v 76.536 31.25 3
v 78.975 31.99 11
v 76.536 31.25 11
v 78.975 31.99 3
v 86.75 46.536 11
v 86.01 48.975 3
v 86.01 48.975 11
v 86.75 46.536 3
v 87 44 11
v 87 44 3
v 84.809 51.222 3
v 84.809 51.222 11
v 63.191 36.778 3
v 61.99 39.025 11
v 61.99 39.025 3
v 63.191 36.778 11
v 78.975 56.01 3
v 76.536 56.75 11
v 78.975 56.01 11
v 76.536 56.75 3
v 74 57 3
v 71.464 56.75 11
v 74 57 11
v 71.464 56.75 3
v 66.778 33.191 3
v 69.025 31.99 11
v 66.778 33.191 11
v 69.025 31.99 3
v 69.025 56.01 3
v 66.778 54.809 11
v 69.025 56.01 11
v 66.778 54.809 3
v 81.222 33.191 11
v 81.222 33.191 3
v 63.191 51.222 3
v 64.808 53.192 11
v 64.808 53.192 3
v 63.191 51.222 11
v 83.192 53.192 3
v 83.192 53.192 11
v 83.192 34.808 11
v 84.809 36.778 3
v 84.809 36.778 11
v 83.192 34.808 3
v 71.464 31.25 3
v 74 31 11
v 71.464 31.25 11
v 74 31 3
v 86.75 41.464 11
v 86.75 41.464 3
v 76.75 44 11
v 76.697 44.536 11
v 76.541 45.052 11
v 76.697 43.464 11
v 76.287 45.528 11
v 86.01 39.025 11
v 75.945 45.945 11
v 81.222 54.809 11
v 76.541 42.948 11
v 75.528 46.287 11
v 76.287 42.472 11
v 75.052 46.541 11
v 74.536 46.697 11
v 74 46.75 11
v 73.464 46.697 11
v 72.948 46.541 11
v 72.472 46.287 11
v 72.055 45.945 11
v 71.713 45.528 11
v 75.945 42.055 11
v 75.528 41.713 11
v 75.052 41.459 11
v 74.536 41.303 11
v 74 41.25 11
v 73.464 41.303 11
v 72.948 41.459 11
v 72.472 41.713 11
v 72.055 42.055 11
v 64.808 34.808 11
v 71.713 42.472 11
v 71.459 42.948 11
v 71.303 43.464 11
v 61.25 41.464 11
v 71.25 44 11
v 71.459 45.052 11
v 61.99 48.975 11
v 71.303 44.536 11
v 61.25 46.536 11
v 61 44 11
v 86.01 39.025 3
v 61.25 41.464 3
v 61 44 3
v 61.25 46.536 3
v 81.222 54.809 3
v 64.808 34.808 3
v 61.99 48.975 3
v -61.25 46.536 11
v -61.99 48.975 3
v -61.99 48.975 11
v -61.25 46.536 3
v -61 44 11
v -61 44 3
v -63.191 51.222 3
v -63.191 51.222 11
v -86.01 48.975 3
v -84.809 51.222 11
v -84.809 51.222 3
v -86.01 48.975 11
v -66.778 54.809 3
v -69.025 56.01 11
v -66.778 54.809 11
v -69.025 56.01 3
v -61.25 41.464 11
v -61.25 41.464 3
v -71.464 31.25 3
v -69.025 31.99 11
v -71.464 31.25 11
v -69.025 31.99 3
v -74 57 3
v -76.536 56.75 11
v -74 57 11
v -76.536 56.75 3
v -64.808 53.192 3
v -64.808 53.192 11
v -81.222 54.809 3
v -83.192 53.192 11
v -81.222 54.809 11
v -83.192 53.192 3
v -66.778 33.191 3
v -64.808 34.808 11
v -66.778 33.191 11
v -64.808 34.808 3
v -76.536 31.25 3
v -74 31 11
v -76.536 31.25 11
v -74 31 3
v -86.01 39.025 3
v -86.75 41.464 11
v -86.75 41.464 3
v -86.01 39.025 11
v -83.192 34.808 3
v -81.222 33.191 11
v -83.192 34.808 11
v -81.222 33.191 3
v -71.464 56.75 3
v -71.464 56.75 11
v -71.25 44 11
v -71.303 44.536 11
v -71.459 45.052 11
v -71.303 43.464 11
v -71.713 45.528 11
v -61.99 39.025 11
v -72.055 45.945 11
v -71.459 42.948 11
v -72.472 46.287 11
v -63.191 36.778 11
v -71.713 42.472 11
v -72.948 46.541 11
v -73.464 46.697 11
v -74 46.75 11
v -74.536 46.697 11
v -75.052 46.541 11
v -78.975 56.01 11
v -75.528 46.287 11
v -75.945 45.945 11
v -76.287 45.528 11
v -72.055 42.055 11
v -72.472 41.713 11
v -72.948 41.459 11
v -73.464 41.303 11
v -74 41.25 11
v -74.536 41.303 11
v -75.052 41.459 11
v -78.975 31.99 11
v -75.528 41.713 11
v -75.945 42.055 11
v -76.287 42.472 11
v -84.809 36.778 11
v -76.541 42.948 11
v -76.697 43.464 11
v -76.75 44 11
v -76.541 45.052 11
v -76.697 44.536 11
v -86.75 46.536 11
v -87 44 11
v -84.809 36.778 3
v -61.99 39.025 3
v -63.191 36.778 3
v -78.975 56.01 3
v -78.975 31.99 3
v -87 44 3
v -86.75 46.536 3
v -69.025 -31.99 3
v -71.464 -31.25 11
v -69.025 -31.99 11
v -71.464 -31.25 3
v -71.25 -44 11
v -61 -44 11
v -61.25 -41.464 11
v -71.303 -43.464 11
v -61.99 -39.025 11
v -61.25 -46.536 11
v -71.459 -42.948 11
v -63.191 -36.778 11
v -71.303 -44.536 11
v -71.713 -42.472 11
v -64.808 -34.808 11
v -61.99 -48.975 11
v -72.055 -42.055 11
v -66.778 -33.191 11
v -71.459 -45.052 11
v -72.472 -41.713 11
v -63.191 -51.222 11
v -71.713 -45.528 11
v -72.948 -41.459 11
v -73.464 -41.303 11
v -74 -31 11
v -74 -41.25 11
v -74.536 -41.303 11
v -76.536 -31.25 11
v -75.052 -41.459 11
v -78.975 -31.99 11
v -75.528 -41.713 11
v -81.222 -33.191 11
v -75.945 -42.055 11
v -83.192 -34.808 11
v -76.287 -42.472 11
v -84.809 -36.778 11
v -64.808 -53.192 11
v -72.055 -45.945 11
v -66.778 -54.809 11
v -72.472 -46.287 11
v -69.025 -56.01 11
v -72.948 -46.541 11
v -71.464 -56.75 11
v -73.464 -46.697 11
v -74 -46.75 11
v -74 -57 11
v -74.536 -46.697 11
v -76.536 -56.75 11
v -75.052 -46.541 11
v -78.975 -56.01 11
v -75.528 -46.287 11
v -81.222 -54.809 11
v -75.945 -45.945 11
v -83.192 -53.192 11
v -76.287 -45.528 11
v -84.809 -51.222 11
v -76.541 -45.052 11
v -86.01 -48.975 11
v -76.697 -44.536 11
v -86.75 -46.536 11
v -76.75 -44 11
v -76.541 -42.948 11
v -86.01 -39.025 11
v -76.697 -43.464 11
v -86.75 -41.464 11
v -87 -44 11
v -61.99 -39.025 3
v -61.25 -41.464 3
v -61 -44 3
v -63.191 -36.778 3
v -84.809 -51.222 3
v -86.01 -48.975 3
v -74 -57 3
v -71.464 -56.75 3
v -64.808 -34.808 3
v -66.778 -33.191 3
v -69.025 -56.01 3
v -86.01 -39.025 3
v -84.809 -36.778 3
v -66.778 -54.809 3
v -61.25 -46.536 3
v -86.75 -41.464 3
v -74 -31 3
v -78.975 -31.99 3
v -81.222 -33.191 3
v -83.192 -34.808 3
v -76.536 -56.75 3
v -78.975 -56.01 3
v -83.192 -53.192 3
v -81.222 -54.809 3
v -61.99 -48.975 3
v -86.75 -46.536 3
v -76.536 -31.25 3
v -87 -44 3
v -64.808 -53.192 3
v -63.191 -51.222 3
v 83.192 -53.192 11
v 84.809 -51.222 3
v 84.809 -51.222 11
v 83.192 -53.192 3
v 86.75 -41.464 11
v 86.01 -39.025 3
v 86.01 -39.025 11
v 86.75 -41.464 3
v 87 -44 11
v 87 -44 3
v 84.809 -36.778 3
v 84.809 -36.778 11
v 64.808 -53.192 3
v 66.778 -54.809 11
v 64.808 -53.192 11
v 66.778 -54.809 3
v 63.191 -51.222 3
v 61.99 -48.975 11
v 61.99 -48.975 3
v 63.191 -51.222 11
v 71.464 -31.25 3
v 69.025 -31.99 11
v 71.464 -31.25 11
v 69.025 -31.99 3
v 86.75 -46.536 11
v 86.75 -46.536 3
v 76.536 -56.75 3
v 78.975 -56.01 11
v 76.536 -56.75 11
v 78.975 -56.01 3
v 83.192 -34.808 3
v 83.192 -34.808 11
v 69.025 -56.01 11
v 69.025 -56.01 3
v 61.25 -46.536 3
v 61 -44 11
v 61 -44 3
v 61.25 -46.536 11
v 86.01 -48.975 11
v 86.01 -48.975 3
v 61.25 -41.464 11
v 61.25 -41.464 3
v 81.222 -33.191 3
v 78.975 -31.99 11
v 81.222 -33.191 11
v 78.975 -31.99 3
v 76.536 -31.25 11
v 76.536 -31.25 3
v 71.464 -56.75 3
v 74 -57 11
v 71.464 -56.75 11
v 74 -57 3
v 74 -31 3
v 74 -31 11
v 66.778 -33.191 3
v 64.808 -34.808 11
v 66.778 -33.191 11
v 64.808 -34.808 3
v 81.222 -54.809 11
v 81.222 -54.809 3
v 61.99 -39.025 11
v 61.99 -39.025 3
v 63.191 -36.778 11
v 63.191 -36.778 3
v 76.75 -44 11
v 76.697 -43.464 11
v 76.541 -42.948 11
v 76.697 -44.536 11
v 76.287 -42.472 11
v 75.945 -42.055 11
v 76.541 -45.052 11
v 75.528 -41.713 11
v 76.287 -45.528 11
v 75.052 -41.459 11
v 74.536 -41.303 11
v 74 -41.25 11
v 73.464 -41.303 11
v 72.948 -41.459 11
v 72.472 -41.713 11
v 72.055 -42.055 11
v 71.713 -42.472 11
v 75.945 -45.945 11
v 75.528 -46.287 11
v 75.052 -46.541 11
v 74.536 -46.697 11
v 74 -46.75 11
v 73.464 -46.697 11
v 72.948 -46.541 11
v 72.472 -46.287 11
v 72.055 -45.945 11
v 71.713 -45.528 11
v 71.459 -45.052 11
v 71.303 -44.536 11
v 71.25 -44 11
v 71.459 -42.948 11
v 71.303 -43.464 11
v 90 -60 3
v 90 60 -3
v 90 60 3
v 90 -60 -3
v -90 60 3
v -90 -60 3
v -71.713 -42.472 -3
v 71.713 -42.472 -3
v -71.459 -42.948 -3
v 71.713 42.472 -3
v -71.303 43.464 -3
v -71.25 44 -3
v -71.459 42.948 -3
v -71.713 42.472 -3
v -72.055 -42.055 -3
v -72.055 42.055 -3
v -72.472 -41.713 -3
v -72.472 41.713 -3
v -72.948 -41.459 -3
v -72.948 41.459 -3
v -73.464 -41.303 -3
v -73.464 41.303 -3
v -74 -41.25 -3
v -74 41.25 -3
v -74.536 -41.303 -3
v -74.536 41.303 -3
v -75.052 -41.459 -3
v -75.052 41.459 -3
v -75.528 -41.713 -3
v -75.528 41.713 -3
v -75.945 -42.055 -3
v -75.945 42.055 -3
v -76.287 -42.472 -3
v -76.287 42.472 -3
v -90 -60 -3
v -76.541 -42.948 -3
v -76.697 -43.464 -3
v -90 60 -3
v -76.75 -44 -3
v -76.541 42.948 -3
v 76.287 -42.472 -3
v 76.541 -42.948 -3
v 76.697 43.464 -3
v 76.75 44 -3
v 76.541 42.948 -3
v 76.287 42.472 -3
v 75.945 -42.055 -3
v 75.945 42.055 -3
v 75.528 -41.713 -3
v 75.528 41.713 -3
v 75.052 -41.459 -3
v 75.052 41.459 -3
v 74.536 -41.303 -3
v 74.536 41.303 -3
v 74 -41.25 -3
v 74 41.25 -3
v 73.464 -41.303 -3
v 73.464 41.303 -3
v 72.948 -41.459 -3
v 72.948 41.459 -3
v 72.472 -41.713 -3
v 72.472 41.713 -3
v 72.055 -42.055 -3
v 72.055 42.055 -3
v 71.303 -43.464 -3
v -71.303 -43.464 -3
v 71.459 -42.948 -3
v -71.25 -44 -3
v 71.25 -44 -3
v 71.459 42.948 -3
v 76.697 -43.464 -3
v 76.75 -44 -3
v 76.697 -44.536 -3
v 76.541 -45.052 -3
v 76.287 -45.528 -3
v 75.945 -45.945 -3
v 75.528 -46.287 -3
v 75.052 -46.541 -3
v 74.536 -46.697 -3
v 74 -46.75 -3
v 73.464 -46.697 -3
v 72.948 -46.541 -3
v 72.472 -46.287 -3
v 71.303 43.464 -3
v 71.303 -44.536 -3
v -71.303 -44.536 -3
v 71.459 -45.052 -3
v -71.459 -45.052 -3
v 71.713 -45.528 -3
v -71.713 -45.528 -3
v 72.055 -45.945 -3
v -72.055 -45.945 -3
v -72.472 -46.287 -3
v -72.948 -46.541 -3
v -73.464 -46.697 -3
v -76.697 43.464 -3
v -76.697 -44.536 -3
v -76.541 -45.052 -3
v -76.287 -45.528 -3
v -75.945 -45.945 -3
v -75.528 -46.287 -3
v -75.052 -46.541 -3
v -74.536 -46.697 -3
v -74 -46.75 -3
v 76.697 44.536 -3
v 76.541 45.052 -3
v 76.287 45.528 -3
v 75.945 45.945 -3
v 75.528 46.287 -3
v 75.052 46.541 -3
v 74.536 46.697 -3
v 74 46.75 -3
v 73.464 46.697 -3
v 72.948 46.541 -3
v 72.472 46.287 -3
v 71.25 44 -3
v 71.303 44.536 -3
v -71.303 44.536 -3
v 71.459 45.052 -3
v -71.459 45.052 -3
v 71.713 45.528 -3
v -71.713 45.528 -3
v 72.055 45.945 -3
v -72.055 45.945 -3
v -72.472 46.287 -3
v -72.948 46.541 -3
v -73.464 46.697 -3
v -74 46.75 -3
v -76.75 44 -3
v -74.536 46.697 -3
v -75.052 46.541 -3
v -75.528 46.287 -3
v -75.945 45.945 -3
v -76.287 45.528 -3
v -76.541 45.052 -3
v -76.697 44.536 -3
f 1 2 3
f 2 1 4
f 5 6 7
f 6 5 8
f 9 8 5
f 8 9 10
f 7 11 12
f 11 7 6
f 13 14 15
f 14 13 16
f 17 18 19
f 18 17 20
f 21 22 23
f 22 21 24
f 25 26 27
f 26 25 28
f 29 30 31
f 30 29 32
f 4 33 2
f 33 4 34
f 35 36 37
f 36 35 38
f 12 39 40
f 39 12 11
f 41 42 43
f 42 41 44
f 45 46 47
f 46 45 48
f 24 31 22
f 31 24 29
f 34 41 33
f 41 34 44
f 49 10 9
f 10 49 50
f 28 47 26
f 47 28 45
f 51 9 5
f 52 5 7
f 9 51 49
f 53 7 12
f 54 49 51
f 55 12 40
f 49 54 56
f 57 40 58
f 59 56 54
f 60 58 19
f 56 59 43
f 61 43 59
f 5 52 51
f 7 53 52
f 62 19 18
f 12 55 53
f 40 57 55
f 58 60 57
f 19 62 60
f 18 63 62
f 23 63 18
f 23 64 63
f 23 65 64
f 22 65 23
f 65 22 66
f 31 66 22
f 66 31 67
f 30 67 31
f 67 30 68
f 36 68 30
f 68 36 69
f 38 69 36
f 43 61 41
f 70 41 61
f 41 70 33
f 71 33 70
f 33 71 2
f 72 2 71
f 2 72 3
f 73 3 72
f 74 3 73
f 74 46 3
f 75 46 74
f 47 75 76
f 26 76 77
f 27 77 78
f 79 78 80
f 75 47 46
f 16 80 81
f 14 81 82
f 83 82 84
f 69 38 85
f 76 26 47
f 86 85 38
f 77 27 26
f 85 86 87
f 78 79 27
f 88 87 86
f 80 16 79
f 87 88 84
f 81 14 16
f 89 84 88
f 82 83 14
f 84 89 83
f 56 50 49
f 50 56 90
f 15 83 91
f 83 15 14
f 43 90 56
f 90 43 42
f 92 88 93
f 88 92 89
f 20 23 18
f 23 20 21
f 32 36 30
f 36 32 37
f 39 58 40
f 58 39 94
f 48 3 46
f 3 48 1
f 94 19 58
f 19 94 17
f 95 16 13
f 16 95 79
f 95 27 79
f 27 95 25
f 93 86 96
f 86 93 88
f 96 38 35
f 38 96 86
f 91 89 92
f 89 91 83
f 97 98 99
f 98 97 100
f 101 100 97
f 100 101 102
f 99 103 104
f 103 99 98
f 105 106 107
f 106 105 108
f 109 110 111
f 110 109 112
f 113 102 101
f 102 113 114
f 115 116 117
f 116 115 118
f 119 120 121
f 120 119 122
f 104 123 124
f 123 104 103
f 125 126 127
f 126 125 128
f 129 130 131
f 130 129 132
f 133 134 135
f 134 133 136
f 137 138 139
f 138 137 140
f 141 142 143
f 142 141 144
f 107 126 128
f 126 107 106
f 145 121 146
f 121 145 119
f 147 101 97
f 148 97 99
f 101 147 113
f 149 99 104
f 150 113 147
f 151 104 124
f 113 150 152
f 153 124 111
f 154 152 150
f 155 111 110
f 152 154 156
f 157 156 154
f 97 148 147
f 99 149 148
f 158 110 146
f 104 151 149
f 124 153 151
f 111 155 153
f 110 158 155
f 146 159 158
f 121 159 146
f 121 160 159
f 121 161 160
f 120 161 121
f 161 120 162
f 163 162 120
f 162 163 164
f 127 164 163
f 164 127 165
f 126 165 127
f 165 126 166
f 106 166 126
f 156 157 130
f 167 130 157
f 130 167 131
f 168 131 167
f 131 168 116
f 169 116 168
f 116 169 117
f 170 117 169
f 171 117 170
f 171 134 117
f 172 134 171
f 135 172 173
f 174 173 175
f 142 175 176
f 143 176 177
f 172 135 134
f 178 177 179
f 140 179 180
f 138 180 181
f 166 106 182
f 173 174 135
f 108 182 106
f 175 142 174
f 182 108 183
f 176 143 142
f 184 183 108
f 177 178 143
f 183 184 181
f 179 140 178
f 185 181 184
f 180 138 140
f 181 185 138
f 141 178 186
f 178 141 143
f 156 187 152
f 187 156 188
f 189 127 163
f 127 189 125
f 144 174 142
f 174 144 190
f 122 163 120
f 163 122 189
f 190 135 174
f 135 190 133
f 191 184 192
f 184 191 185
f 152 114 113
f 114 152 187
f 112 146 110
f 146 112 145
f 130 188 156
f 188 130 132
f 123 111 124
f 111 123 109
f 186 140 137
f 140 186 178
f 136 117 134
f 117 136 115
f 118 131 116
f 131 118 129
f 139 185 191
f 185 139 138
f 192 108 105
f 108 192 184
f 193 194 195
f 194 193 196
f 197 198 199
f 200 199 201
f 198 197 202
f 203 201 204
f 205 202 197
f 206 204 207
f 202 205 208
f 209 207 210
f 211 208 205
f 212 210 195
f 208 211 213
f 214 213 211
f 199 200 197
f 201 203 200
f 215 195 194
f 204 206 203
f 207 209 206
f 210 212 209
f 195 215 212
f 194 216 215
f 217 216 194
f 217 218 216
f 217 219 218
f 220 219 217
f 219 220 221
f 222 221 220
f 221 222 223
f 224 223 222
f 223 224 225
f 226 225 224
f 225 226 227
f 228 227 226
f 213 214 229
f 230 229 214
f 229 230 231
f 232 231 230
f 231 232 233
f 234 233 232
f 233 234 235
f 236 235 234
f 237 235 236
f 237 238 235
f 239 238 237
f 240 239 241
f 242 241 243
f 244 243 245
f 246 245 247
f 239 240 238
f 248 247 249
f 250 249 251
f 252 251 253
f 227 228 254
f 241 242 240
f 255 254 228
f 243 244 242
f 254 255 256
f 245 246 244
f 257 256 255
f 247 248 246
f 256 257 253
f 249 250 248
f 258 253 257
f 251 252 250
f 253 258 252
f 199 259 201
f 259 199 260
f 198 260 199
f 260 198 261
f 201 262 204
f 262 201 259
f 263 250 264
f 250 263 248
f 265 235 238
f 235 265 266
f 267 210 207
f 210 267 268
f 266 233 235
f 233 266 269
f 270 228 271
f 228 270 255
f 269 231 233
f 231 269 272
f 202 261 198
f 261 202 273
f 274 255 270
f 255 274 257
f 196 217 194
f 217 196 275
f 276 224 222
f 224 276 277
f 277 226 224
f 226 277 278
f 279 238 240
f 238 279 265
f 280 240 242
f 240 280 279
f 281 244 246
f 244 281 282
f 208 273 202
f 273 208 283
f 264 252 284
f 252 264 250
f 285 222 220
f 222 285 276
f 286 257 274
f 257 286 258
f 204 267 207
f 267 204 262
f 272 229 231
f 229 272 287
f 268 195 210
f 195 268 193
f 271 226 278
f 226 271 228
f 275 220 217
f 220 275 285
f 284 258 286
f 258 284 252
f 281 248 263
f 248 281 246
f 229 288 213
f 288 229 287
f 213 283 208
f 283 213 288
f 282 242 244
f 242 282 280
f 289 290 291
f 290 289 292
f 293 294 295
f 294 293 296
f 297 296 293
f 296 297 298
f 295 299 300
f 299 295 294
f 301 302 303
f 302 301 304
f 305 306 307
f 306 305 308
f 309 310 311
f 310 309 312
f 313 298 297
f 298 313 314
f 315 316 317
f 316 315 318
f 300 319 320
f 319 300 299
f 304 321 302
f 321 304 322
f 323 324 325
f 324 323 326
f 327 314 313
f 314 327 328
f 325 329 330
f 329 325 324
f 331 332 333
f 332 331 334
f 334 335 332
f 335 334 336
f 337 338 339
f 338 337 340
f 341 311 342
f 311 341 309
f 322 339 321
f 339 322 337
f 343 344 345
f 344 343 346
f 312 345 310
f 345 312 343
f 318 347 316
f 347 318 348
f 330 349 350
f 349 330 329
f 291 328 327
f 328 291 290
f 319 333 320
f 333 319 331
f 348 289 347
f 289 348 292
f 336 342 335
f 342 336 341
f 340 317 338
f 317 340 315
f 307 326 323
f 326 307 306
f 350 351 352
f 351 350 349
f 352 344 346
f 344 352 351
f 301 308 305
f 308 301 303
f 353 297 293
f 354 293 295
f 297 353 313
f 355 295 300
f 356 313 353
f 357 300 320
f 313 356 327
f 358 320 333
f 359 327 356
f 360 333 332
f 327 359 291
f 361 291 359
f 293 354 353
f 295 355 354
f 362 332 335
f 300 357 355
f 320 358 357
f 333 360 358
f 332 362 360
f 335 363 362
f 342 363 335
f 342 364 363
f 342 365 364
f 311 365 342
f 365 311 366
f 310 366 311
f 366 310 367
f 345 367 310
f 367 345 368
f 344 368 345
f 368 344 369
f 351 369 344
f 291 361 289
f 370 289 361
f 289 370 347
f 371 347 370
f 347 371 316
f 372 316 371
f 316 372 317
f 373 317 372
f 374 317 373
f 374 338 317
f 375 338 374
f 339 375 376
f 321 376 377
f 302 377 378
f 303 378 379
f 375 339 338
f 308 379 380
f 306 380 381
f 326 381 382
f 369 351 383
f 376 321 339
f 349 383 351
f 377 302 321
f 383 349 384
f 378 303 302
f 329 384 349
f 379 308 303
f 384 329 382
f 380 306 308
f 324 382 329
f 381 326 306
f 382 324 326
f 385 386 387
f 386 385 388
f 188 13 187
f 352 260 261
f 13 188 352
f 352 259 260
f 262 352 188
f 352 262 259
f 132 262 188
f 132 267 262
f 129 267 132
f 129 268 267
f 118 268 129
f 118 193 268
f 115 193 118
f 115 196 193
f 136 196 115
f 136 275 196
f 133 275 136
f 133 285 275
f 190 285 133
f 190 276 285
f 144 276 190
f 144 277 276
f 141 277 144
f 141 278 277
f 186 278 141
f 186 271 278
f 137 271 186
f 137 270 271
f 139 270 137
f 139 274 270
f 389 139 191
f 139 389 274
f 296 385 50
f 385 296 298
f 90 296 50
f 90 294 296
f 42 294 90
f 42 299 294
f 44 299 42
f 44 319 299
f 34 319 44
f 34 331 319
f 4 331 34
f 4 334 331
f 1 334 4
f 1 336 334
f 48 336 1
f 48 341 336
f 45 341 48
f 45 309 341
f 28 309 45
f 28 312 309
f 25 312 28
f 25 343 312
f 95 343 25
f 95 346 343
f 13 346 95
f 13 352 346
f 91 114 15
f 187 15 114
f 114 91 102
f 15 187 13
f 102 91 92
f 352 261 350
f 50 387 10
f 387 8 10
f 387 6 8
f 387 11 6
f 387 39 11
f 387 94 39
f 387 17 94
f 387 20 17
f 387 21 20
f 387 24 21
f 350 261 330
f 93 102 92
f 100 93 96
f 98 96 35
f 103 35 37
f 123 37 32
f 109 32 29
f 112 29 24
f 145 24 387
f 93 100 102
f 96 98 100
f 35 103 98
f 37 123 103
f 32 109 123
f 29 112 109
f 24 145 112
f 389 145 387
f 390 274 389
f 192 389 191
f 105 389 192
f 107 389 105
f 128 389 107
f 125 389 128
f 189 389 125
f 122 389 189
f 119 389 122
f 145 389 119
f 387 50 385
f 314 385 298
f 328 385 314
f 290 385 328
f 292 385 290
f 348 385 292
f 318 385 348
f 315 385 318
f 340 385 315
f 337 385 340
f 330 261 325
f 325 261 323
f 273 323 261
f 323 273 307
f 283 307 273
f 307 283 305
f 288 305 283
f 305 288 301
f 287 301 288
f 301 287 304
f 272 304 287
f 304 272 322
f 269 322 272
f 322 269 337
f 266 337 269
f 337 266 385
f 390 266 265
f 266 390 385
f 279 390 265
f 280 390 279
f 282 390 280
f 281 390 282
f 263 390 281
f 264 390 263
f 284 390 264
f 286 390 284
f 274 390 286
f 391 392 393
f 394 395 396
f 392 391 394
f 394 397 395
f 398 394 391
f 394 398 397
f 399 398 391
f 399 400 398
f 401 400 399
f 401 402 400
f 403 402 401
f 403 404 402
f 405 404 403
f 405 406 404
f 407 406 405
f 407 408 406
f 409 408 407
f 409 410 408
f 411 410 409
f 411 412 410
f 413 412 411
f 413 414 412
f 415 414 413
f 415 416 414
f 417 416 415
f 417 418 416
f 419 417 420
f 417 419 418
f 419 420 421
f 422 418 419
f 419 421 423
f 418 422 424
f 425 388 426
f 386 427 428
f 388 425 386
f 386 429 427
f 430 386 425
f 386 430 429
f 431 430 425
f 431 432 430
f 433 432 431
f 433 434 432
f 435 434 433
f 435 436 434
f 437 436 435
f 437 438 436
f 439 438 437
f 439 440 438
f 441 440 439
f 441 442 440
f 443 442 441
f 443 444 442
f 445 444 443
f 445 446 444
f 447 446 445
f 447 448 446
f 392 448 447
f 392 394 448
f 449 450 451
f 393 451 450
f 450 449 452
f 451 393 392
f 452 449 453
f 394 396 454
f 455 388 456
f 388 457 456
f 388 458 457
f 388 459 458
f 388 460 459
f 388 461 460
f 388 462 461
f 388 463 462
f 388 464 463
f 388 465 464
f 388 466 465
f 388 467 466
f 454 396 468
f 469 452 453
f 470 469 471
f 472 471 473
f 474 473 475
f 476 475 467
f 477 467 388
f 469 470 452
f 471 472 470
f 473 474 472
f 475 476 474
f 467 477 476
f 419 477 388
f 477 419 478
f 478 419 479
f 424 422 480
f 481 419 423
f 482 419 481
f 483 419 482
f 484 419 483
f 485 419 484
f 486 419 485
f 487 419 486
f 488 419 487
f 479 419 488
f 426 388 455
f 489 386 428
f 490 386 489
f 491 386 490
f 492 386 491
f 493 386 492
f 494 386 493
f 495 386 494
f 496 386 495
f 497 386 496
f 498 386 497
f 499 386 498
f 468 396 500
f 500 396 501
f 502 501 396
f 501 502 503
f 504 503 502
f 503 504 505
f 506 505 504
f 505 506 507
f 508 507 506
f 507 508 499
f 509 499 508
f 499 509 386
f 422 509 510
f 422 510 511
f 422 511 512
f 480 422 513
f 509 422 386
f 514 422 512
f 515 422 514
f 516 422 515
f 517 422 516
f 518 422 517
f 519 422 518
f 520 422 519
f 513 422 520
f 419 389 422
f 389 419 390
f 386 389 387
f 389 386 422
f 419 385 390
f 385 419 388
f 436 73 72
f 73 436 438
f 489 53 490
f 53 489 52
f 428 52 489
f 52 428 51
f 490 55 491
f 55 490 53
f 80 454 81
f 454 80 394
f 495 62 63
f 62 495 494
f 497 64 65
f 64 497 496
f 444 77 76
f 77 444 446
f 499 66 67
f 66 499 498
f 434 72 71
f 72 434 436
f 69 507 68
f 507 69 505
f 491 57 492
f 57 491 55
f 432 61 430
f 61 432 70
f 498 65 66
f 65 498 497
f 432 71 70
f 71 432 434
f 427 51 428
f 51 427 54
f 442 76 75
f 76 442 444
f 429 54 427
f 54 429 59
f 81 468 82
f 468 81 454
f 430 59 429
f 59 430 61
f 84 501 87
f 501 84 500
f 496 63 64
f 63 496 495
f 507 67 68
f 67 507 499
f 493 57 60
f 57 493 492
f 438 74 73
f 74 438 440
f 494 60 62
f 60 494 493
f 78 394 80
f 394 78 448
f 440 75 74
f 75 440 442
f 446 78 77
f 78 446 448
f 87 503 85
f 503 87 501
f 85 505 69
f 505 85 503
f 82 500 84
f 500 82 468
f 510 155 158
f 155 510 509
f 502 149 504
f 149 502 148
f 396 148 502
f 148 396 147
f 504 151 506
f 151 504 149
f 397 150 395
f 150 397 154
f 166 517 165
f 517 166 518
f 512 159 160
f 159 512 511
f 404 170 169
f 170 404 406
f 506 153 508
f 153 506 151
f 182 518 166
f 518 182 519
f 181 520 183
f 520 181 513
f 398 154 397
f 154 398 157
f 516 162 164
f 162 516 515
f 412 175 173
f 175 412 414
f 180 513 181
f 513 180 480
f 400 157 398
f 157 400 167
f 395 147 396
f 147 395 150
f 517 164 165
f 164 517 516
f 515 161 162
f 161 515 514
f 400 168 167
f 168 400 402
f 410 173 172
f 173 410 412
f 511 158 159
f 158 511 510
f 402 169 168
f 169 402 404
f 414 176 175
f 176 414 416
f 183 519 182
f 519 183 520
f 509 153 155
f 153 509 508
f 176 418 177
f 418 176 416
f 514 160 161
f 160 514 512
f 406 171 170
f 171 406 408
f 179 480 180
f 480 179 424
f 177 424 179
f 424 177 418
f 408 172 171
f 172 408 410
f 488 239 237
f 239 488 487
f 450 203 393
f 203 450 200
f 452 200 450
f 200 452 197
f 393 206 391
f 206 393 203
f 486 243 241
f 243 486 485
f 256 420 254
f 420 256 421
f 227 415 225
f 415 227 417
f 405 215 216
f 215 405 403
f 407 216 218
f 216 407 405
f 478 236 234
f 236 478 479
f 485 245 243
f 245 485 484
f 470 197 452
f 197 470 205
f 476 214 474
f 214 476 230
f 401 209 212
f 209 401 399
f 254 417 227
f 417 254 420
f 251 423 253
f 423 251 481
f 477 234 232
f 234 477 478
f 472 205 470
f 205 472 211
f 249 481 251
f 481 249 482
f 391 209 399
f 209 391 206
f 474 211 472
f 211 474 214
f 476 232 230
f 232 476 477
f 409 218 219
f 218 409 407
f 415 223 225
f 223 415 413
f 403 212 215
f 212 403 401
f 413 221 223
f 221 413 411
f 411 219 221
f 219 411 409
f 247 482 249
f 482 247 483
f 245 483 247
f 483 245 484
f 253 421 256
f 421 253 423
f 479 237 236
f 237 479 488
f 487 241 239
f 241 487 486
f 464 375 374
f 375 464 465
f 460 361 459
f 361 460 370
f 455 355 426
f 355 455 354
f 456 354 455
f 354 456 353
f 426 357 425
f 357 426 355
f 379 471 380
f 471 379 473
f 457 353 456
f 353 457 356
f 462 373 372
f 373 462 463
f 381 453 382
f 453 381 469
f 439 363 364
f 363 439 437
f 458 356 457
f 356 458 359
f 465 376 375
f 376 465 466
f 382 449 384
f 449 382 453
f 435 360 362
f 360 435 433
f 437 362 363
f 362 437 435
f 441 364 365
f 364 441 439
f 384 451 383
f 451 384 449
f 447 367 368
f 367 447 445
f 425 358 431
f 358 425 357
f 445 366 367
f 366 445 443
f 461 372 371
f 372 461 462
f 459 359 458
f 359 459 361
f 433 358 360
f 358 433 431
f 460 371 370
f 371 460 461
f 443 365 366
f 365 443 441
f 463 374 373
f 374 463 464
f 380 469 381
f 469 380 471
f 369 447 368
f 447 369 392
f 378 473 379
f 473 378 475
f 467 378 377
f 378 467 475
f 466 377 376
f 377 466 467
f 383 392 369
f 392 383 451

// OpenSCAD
$fn = 32;

// ----------------------------------------------------------------------
// Anchor pads 180 x 120 x 14
// four corner bosses with anchor holes
// ----------------------------------------------------------------------

// --- parameters (mm) ---
plate = [180, 120, 6];  // base plate size (x, y, z)
pads = 4;               // boss count, one per corner
edge = 16;              // boss centre offset from the plate edge
boss_d = 26;            // boss diameter
boss_h = 8;             // boss height above the base plate
hole_d = 5.5;           // hole diameter

// --- derived feature positions (mm) ---
height = plate[2] + boss_h;      // = 14   overall height of the part
corner_x = plate[0] / 2 - edge;  // = 74   boss centre X
corner_y = plate[1] / 2 - edge;  // = 44   boss centre Y
feature_centers = [
  [corner_x, corner_y],
  [-corner_x, corner_y],
  [-corner_x, -corner_y],
  [corner_x, -corner_y]
];   // boss centres, anchor holes are drilled there

// base plate, four bosses standing on it, anchor holes all the way through
difference() {
  union() {
    cube(plate, center = true);
    for (centre = feature_centers)
      translate([centre[0], centre[1], plate[2] / 2 - 1])
        cylinder(d = boss_d, h = boss_h + 1);
  }
  for (centre = feature_centers)
    translate([centre[0], centre[1], -height])
      cylinder(d = hole_d, h = 2 * height + 2);  // through boss and plate
}
